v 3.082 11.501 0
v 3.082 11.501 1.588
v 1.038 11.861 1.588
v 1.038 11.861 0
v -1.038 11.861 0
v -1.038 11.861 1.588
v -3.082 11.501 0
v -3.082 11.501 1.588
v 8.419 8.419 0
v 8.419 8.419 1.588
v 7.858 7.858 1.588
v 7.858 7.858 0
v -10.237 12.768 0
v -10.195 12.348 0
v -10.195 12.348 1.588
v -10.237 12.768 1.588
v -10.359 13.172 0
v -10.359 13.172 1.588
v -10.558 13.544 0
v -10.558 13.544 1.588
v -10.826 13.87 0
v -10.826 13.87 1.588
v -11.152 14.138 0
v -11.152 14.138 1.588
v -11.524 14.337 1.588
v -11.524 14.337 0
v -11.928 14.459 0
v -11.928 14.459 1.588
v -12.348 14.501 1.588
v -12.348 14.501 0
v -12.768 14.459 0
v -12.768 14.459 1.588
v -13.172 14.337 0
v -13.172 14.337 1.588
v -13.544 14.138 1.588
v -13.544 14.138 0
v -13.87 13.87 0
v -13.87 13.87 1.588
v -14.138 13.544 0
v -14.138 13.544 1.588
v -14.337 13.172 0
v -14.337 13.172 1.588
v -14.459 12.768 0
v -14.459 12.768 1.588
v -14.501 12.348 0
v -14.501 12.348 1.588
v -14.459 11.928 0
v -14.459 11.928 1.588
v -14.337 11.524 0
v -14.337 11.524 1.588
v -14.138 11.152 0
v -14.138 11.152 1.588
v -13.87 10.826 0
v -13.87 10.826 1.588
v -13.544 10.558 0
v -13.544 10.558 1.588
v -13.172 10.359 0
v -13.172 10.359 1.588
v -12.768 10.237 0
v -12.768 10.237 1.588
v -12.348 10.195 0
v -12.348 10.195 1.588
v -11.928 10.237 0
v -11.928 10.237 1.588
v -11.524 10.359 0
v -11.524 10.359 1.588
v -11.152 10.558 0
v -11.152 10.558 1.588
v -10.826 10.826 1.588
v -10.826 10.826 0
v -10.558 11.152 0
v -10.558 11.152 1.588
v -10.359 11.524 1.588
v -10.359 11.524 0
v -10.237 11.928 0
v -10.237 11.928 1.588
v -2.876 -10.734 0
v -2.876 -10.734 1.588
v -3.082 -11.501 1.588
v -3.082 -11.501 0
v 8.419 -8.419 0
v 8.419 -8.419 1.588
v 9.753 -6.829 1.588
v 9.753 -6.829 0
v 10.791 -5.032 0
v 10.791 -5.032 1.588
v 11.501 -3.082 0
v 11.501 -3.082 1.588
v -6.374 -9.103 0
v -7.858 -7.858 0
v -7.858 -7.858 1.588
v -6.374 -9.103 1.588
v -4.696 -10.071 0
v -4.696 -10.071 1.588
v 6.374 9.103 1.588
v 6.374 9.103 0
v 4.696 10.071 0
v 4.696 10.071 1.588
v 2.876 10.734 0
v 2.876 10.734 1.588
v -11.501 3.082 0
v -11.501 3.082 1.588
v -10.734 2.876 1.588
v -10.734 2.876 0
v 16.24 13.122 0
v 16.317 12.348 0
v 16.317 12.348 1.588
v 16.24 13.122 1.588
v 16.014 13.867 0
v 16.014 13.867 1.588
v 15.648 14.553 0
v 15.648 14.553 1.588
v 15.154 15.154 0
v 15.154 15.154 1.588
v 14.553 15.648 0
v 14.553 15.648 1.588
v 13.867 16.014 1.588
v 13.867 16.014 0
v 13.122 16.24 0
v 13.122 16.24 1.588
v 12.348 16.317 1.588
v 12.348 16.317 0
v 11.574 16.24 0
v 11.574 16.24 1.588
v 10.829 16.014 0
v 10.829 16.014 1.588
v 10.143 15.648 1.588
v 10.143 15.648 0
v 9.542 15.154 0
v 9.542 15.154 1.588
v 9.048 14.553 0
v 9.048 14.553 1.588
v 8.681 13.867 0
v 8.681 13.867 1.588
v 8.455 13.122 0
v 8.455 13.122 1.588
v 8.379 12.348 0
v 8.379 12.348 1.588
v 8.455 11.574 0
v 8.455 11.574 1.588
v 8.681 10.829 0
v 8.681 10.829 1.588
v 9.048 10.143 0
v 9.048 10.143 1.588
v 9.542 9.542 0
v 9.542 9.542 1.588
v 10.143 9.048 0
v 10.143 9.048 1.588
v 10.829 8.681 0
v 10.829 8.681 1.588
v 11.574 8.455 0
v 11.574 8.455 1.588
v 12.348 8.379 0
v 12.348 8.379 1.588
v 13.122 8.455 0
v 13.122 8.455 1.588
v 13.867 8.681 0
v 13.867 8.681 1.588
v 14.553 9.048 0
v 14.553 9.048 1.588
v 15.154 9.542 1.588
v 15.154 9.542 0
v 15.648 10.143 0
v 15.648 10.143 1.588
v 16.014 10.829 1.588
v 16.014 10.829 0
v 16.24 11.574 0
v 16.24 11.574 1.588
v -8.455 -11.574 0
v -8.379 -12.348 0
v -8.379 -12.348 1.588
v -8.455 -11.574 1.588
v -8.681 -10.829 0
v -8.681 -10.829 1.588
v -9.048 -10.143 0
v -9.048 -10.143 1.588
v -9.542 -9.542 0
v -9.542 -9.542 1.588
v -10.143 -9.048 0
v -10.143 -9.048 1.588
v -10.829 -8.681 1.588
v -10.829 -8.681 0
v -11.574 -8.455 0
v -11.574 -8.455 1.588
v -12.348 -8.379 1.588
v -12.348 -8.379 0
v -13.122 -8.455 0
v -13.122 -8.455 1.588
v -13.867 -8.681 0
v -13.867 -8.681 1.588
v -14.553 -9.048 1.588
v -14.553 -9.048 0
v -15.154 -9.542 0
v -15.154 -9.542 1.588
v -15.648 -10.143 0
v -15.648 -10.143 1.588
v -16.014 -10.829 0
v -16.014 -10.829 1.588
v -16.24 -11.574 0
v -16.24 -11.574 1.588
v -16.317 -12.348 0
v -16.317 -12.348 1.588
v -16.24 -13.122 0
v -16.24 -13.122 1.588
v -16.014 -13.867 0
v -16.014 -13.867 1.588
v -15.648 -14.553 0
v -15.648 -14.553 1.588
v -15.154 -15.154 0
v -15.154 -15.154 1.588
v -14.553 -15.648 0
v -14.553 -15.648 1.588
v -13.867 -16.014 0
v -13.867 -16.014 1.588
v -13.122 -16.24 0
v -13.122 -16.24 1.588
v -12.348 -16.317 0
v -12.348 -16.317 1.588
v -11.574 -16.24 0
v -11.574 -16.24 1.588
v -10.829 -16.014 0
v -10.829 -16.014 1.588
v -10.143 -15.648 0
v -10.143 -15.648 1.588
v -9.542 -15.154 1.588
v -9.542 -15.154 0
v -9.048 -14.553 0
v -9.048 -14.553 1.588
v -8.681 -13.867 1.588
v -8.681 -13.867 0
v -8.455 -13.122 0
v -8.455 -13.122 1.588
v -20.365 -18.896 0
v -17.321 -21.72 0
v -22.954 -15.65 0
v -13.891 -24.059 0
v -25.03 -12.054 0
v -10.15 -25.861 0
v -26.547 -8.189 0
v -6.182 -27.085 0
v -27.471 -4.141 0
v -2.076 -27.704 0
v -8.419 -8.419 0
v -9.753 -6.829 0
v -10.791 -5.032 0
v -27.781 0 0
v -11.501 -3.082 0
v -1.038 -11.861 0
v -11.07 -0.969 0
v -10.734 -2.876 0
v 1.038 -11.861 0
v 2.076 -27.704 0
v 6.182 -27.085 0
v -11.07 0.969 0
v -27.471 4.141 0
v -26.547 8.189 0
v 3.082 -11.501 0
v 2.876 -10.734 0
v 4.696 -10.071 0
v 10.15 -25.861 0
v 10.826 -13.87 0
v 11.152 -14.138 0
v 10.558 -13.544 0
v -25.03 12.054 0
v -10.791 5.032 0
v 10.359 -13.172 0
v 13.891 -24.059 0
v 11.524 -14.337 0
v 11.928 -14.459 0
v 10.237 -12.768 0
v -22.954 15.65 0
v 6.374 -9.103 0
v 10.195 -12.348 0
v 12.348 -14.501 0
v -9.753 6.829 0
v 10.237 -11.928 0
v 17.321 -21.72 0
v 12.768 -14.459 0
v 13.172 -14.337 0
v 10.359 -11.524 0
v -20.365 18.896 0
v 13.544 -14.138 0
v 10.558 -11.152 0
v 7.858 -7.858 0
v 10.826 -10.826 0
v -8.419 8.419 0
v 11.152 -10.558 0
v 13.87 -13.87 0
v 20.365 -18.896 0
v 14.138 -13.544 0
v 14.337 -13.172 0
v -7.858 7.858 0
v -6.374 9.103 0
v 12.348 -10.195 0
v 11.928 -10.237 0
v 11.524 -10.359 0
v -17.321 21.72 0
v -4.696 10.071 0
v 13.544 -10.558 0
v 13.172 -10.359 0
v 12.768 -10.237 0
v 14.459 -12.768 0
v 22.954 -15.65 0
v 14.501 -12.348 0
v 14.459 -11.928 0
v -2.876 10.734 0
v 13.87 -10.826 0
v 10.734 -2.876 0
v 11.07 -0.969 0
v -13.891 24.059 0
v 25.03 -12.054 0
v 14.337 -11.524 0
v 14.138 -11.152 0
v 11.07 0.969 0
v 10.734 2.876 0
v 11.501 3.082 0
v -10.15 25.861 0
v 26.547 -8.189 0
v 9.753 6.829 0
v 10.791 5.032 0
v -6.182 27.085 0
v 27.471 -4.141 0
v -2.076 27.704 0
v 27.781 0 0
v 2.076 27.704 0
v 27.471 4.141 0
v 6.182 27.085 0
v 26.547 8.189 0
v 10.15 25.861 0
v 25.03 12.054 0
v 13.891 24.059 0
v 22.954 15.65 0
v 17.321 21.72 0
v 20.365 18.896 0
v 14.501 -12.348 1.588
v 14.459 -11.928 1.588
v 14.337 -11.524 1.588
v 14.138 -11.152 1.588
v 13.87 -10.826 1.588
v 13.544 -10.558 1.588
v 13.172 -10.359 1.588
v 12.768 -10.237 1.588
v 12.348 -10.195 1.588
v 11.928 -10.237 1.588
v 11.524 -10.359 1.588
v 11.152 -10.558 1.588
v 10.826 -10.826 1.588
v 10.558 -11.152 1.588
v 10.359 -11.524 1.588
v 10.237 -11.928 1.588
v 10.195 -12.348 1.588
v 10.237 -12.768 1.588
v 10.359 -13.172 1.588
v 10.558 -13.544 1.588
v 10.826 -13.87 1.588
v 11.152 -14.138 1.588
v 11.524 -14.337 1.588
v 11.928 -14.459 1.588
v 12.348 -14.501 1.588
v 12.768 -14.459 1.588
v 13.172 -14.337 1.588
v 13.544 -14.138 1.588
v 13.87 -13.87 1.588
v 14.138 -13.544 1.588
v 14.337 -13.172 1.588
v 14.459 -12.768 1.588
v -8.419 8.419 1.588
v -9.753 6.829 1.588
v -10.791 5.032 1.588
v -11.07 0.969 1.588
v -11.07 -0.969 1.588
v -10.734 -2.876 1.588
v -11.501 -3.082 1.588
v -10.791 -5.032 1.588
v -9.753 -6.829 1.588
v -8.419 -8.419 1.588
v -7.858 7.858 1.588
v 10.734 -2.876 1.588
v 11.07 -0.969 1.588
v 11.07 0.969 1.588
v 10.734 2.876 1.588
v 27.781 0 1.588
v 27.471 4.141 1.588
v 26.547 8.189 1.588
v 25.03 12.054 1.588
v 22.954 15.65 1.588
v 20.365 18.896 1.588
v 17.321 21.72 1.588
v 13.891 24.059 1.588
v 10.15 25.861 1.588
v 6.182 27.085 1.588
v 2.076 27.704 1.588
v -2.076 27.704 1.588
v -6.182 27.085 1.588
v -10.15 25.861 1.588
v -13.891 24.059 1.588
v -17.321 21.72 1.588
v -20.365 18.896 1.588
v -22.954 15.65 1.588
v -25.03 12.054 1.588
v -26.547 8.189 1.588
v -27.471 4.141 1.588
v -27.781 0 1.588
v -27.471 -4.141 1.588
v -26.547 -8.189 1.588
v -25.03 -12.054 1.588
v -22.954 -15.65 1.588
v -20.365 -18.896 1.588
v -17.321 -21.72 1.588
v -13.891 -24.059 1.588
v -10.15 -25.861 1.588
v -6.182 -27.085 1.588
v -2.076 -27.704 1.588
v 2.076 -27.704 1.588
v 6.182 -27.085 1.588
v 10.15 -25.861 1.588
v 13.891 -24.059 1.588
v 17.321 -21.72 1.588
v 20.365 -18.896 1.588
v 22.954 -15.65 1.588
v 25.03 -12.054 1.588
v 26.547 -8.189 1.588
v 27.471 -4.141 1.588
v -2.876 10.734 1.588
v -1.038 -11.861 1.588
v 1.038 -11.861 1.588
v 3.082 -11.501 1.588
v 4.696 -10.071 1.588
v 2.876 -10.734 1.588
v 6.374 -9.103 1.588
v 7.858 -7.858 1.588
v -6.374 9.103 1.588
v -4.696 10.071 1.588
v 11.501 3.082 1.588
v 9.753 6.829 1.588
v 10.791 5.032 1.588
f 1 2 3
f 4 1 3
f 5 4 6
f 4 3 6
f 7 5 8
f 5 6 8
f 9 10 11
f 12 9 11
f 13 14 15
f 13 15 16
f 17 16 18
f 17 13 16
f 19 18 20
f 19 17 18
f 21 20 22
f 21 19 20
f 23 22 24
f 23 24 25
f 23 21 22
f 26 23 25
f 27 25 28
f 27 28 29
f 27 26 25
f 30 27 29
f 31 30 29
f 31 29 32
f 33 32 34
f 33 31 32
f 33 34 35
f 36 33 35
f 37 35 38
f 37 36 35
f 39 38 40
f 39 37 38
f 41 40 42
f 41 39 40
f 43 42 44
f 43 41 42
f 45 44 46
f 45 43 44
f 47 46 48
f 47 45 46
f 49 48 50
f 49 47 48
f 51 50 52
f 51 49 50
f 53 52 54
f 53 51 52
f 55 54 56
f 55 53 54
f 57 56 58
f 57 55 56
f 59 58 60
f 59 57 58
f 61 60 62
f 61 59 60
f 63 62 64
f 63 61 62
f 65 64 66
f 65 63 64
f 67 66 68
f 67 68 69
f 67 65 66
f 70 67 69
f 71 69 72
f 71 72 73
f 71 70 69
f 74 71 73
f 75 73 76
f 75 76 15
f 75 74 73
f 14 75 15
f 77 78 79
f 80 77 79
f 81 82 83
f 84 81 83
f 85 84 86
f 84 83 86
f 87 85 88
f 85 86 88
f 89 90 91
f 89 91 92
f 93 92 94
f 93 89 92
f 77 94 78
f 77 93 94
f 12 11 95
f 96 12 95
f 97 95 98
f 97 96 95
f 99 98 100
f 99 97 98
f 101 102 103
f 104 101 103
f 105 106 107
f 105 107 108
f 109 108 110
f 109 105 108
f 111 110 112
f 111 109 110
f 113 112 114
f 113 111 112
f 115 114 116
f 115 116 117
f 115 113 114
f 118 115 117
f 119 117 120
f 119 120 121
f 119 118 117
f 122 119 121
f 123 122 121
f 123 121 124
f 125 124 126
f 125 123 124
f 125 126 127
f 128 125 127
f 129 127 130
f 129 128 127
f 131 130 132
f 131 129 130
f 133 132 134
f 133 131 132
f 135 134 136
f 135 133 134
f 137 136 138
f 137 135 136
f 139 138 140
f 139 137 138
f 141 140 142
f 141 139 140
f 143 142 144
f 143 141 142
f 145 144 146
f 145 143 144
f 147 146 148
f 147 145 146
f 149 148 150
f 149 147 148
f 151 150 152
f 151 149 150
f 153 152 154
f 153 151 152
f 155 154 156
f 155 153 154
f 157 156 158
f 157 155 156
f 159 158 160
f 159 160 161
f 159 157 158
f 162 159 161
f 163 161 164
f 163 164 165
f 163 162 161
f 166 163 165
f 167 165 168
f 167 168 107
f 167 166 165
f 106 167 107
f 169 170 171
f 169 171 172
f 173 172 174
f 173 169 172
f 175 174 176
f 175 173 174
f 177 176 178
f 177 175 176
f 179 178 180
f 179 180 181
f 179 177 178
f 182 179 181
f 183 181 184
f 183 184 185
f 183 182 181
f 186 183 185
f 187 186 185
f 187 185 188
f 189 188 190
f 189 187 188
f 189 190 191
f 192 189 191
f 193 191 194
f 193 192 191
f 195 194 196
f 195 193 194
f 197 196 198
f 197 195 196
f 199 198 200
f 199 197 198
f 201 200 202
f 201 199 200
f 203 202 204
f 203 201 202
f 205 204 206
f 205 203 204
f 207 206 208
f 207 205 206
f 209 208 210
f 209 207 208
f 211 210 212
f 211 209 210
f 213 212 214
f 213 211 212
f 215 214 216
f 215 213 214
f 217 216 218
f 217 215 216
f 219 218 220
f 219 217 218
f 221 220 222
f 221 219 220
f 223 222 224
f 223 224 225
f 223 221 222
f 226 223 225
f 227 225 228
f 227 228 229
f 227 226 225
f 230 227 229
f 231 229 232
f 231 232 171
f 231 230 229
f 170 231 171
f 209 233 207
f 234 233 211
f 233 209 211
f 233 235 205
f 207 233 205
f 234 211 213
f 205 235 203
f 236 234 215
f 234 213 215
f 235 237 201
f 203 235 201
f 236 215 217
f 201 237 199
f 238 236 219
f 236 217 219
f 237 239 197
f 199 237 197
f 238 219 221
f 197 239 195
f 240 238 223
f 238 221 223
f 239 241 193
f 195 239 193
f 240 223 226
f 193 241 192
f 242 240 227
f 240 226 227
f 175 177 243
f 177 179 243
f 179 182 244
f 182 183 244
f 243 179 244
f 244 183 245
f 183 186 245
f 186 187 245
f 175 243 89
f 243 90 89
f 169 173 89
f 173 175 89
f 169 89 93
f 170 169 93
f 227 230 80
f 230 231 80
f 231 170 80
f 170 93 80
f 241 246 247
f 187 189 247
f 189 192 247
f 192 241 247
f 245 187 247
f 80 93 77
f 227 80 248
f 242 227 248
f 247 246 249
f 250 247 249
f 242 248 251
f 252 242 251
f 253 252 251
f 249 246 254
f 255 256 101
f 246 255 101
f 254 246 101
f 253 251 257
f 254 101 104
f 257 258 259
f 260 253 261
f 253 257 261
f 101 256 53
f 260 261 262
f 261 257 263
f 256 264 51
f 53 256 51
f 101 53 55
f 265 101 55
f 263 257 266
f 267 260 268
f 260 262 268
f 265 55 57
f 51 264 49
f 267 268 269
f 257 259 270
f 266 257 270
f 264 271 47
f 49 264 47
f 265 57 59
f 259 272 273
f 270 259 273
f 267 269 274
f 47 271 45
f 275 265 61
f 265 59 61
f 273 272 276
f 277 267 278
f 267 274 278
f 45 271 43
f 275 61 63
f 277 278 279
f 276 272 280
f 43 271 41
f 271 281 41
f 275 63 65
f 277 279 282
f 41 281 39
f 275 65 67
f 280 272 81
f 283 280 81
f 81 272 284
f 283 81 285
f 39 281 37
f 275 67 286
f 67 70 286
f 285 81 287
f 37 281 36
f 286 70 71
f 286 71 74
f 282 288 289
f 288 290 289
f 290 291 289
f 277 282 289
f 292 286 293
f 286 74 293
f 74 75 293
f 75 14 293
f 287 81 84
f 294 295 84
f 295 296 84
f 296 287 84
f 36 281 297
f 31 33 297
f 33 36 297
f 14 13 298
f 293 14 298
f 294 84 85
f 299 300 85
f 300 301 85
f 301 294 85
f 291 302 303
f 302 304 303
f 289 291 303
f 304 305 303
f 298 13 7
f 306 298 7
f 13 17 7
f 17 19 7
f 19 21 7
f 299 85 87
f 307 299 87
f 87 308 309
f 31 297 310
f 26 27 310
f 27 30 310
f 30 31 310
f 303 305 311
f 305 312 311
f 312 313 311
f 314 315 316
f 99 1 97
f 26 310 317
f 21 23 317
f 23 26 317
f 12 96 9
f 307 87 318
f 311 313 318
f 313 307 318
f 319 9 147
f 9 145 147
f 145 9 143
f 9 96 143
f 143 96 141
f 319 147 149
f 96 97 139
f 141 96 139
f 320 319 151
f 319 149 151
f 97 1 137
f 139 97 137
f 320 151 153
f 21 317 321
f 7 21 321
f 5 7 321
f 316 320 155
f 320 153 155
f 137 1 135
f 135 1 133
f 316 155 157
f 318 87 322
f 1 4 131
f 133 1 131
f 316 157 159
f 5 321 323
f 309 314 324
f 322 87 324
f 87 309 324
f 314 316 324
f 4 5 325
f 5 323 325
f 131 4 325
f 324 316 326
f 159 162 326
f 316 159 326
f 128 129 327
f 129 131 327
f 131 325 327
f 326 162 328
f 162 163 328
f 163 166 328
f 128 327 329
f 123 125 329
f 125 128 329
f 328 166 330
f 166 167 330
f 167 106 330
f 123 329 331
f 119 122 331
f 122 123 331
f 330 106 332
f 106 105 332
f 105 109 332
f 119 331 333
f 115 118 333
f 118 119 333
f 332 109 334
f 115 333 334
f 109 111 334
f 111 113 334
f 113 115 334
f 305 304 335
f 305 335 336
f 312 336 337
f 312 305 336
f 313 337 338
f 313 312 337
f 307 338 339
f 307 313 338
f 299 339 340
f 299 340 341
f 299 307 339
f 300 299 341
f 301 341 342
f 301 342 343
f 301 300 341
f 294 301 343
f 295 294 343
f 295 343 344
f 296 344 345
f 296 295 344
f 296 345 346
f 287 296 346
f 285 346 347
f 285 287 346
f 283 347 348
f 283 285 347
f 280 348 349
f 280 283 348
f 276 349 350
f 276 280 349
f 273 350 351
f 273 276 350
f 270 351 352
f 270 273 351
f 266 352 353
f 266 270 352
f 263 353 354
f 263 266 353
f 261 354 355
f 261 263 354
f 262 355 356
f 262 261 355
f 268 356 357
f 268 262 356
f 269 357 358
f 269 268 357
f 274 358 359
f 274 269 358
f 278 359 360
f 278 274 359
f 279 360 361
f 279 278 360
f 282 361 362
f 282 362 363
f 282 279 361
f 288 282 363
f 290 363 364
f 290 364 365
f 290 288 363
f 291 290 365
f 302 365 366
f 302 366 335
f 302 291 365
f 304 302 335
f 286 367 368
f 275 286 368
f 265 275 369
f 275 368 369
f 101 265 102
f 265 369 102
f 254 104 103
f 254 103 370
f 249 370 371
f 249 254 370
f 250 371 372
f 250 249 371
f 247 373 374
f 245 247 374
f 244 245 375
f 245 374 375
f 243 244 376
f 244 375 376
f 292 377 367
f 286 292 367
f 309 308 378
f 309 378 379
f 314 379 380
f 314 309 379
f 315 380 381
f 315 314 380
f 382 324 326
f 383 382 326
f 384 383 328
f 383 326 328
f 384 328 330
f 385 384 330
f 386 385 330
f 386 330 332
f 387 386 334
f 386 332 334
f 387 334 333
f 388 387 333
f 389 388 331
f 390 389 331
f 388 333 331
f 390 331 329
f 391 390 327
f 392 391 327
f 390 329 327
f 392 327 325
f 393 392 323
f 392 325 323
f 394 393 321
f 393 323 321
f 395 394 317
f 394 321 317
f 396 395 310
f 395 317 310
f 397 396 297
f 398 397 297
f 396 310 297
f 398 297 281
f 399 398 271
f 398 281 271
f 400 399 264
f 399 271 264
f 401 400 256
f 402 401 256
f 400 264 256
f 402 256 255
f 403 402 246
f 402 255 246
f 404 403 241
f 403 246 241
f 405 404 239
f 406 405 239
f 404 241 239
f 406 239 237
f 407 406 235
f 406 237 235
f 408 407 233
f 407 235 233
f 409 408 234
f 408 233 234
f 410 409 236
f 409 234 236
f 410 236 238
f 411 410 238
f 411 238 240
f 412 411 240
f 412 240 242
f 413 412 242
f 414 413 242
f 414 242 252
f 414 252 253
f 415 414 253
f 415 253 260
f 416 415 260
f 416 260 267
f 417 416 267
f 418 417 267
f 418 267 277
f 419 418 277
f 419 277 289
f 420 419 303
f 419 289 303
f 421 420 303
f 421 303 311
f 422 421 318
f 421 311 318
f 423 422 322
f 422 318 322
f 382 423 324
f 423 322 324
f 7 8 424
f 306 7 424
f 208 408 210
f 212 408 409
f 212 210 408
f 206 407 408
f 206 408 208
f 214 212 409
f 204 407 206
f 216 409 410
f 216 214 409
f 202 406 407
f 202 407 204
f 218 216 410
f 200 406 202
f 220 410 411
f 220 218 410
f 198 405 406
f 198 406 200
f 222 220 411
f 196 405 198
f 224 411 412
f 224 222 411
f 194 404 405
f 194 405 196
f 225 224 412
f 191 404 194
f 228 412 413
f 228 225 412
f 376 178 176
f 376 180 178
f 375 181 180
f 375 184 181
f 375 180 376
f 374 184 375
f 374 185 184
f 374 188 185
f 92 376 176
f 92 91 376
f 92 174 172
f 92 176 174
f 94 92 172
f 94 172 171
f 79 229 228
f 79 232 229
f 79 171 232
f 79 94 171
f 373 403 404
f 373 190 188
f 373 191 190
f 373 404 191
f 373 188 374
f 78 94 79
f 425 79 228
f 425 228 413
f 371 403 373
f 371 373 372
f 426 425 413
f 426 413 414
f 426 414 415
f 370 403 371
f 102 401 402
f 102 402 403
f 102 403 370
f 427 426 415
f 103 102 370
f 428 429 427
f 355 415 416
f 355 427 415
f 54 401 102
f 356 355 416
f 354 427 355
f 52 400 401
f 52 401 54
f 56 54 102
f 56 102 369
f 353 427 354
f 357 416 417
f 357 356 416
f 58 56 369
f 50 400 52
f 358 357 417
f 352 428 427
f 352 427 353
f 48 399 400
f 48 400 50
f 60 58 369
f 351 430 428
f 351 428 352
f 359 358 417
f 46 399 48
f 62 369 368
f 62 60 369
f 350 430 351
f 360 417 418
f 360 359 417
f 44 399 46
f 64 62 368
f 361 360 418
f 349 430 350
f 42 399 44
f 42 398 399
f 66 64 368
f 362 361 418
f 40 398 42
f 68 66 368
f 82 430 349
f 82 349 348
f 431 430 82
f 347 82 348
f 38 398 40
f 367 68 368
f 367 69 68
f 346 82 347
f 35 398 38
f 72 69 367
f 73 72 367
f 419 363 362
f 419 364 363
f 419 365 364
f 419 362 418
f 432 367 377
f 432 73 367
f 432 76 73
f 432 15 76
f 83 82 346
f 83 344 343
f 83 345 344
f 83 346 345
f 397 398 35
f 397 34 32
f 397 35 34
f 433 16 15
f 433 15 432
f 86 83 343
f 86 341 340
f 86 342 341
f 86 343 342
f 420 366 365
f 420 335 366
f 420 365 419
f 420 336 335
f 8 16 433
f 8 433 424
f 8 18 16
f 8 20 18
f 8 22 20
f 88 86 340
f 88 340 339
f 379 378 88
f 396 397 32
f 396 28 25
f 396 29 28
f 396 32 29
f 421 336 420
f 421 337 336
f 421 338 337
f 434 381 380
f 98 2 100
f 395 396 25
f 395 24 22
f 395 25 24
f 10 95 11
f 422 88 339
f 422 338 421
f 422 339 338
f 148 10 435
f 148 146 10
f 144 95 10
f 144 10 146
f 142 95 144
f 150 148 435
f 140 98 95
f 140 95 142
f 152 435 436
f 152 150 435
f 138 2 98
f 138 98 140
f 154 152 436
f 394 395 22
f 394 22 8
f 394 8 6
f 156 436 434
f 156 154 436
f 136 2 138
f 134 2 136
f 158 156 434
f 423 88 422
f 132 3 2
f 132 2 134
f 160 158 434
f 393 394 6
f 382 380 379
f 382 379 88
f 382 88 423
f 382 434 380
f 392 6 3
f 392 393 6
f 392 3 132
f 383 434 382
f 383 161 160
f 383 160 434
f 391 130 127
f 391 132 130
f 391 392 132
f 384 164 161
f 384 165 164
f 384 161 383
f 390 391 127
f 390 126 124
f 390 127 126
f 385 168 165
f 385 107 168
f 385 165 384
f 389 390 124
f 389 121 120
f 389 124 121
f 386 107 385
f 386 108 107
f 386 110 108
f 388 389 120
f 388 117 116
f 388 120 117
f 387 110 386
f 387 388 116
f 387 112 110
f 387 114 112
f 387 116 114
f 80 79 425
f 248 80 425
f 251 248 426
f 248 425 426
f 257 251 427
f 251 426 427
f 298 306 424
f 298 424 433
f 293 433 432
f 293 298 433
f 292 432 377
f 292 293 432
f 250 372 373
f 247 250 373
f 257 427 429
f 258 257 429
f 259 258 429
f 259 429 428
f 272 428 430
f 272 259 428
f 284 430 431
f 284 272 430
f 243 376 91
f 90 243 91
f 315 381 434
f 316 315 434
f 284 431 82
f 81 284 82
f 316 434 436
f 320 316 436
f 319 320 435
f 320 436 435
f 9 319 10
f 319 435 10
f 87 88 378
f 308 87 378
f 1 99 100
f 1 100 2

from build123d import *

# Parameters (mm, degrees)
F0_R     = 27.78125
F0_R_2   = 3.96875
F0_R_3   = 2.15265
F0_R_4   = 11.1125
F1_DEPTH = 1.5875
F3_DEPTH = 1.5875
F4_COUNT = 6
F4_ANGLE = 300


with BuildPart() as f1:
    # F0 (on Top) → F1 (new body)
    with BuildSketch(Plane.XY):
        Circle(F0_R)
        with Locations((-12.3478521665, -12.3478521665)):
            Circle(F0_R_2, mode=Mode.SUBTRACT)
        with Locations((12.3478521665, -12.3478521665)):
            Circle(F0_R_3, mode=Mode.SUBTRACT)
        with Locations((-12.3478521665, 12.3478521665)):
            Circle(F0_R_3, mode=Mode.SUBTRACT)
        Circle(F0_R_4, mode=Mode.SUBTRACT)
        with Locations((12.3478521665, 12.3478521665)):
            Circle(F0_R_2, mode=Mode.SUBTRACT)
    extrude(amount=F1_DEPTH)

    # F2 (on face) → F3 (cut, through all)
    with BuildSketch(Plane.XY.offset(1.5875)):
        with BuildLine():
            Line((-3.0815642558, 11.5005543693), (-2.8761266387, 10.7338507446))
            ThreePointArc((-2.8761266387, 10.7338507446), (0, 11.1125), (2.8761266387, 10.7338507446))
            Line((2.8761266387, 10.7338507446), (3.0815642558, 11.5005543693))
            ThreePointArc((3.0815642558, 11.5005543693), (0, 11.90625), (-3.0815642558, 11.5005543693))
        make_face()
    f3 = extrude(amount=-F3_DEPTH, mode=Mode.SUBTRACT)

    # F4: F3 ×6 about axis
    f4_axis = Axis((0, 0, 0), (0, 0, -1))
    for i in range(1, F4_COUNT):
        add(f3.rotate(f4_axis, i * F4_ANGLE / (F4_COUNT - 1)), mode=Mode.SUBTRACT)


solid = f1.part
